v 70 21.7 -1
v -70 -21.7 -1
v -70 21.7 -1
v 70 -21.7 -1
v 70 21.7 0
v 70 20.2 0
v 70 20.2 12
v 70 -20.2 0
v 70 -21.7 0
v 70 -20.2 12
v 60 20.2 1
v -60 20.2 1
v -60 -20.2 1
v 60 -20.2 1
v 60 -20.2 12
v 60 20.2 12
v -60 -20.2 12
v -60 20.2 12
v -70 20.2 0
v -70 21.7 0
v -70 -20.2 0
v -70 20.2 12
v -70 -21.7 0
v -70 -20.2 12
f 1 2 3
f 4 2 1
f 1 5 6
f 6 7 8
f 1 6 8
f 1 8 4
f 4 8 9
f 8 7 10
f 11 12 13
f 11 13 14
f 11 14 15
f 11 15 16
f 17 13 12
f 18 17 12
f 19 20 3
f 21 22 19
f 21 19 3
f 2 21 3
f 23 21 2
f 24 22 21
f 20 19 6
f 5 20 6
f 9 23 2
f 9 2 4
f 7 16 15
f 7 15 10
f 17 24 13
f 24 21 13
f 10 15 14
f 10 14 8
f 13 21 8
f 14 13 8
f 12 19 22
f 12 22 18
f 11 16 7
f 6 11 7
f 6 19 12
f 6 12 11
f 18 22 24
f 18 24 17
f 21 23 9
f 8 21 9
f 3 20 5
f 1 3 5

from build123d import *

# Parameters (mm, degrees)
F0_W     = 140
F0_H     = 40.4
F1_DEPTH = 1
F2_W     = 10
F2_H     = 40.4
F3_DEPTH = 11
F4_W     = 140
F4_H     = 43.4
F5_DEPTH = 1


with BuildPart() as f1:
    # F0 (on Top) → F1 (new body)
    with BuildSketch(Plane.XY):
        Rectangle(F0_W, F0_H)
    extrude(amount=F1_DEPTH)

    # F2 (on face) → F3 (join)
    with BuildSketch(Plane.XY.offset(1)):
        with Locations((-65, 0)):
            Rectangle(F2_W, F2_H)
        with Locations((65, 0)):
            Rectangle(F2_W, F2_H)
    extrude(amount=F3_DEPTH)

    # F4 (on face) → F5 (join)
    with BuildSketch(Plane(origin=(0, 0, 0), x_dir=(1, 0, 0), z_dir=(0, 0, -1))):
        Rectangle(F4_W, F4_H)
    extrude(amount=F5_DEPTH)


solid = f1.part
